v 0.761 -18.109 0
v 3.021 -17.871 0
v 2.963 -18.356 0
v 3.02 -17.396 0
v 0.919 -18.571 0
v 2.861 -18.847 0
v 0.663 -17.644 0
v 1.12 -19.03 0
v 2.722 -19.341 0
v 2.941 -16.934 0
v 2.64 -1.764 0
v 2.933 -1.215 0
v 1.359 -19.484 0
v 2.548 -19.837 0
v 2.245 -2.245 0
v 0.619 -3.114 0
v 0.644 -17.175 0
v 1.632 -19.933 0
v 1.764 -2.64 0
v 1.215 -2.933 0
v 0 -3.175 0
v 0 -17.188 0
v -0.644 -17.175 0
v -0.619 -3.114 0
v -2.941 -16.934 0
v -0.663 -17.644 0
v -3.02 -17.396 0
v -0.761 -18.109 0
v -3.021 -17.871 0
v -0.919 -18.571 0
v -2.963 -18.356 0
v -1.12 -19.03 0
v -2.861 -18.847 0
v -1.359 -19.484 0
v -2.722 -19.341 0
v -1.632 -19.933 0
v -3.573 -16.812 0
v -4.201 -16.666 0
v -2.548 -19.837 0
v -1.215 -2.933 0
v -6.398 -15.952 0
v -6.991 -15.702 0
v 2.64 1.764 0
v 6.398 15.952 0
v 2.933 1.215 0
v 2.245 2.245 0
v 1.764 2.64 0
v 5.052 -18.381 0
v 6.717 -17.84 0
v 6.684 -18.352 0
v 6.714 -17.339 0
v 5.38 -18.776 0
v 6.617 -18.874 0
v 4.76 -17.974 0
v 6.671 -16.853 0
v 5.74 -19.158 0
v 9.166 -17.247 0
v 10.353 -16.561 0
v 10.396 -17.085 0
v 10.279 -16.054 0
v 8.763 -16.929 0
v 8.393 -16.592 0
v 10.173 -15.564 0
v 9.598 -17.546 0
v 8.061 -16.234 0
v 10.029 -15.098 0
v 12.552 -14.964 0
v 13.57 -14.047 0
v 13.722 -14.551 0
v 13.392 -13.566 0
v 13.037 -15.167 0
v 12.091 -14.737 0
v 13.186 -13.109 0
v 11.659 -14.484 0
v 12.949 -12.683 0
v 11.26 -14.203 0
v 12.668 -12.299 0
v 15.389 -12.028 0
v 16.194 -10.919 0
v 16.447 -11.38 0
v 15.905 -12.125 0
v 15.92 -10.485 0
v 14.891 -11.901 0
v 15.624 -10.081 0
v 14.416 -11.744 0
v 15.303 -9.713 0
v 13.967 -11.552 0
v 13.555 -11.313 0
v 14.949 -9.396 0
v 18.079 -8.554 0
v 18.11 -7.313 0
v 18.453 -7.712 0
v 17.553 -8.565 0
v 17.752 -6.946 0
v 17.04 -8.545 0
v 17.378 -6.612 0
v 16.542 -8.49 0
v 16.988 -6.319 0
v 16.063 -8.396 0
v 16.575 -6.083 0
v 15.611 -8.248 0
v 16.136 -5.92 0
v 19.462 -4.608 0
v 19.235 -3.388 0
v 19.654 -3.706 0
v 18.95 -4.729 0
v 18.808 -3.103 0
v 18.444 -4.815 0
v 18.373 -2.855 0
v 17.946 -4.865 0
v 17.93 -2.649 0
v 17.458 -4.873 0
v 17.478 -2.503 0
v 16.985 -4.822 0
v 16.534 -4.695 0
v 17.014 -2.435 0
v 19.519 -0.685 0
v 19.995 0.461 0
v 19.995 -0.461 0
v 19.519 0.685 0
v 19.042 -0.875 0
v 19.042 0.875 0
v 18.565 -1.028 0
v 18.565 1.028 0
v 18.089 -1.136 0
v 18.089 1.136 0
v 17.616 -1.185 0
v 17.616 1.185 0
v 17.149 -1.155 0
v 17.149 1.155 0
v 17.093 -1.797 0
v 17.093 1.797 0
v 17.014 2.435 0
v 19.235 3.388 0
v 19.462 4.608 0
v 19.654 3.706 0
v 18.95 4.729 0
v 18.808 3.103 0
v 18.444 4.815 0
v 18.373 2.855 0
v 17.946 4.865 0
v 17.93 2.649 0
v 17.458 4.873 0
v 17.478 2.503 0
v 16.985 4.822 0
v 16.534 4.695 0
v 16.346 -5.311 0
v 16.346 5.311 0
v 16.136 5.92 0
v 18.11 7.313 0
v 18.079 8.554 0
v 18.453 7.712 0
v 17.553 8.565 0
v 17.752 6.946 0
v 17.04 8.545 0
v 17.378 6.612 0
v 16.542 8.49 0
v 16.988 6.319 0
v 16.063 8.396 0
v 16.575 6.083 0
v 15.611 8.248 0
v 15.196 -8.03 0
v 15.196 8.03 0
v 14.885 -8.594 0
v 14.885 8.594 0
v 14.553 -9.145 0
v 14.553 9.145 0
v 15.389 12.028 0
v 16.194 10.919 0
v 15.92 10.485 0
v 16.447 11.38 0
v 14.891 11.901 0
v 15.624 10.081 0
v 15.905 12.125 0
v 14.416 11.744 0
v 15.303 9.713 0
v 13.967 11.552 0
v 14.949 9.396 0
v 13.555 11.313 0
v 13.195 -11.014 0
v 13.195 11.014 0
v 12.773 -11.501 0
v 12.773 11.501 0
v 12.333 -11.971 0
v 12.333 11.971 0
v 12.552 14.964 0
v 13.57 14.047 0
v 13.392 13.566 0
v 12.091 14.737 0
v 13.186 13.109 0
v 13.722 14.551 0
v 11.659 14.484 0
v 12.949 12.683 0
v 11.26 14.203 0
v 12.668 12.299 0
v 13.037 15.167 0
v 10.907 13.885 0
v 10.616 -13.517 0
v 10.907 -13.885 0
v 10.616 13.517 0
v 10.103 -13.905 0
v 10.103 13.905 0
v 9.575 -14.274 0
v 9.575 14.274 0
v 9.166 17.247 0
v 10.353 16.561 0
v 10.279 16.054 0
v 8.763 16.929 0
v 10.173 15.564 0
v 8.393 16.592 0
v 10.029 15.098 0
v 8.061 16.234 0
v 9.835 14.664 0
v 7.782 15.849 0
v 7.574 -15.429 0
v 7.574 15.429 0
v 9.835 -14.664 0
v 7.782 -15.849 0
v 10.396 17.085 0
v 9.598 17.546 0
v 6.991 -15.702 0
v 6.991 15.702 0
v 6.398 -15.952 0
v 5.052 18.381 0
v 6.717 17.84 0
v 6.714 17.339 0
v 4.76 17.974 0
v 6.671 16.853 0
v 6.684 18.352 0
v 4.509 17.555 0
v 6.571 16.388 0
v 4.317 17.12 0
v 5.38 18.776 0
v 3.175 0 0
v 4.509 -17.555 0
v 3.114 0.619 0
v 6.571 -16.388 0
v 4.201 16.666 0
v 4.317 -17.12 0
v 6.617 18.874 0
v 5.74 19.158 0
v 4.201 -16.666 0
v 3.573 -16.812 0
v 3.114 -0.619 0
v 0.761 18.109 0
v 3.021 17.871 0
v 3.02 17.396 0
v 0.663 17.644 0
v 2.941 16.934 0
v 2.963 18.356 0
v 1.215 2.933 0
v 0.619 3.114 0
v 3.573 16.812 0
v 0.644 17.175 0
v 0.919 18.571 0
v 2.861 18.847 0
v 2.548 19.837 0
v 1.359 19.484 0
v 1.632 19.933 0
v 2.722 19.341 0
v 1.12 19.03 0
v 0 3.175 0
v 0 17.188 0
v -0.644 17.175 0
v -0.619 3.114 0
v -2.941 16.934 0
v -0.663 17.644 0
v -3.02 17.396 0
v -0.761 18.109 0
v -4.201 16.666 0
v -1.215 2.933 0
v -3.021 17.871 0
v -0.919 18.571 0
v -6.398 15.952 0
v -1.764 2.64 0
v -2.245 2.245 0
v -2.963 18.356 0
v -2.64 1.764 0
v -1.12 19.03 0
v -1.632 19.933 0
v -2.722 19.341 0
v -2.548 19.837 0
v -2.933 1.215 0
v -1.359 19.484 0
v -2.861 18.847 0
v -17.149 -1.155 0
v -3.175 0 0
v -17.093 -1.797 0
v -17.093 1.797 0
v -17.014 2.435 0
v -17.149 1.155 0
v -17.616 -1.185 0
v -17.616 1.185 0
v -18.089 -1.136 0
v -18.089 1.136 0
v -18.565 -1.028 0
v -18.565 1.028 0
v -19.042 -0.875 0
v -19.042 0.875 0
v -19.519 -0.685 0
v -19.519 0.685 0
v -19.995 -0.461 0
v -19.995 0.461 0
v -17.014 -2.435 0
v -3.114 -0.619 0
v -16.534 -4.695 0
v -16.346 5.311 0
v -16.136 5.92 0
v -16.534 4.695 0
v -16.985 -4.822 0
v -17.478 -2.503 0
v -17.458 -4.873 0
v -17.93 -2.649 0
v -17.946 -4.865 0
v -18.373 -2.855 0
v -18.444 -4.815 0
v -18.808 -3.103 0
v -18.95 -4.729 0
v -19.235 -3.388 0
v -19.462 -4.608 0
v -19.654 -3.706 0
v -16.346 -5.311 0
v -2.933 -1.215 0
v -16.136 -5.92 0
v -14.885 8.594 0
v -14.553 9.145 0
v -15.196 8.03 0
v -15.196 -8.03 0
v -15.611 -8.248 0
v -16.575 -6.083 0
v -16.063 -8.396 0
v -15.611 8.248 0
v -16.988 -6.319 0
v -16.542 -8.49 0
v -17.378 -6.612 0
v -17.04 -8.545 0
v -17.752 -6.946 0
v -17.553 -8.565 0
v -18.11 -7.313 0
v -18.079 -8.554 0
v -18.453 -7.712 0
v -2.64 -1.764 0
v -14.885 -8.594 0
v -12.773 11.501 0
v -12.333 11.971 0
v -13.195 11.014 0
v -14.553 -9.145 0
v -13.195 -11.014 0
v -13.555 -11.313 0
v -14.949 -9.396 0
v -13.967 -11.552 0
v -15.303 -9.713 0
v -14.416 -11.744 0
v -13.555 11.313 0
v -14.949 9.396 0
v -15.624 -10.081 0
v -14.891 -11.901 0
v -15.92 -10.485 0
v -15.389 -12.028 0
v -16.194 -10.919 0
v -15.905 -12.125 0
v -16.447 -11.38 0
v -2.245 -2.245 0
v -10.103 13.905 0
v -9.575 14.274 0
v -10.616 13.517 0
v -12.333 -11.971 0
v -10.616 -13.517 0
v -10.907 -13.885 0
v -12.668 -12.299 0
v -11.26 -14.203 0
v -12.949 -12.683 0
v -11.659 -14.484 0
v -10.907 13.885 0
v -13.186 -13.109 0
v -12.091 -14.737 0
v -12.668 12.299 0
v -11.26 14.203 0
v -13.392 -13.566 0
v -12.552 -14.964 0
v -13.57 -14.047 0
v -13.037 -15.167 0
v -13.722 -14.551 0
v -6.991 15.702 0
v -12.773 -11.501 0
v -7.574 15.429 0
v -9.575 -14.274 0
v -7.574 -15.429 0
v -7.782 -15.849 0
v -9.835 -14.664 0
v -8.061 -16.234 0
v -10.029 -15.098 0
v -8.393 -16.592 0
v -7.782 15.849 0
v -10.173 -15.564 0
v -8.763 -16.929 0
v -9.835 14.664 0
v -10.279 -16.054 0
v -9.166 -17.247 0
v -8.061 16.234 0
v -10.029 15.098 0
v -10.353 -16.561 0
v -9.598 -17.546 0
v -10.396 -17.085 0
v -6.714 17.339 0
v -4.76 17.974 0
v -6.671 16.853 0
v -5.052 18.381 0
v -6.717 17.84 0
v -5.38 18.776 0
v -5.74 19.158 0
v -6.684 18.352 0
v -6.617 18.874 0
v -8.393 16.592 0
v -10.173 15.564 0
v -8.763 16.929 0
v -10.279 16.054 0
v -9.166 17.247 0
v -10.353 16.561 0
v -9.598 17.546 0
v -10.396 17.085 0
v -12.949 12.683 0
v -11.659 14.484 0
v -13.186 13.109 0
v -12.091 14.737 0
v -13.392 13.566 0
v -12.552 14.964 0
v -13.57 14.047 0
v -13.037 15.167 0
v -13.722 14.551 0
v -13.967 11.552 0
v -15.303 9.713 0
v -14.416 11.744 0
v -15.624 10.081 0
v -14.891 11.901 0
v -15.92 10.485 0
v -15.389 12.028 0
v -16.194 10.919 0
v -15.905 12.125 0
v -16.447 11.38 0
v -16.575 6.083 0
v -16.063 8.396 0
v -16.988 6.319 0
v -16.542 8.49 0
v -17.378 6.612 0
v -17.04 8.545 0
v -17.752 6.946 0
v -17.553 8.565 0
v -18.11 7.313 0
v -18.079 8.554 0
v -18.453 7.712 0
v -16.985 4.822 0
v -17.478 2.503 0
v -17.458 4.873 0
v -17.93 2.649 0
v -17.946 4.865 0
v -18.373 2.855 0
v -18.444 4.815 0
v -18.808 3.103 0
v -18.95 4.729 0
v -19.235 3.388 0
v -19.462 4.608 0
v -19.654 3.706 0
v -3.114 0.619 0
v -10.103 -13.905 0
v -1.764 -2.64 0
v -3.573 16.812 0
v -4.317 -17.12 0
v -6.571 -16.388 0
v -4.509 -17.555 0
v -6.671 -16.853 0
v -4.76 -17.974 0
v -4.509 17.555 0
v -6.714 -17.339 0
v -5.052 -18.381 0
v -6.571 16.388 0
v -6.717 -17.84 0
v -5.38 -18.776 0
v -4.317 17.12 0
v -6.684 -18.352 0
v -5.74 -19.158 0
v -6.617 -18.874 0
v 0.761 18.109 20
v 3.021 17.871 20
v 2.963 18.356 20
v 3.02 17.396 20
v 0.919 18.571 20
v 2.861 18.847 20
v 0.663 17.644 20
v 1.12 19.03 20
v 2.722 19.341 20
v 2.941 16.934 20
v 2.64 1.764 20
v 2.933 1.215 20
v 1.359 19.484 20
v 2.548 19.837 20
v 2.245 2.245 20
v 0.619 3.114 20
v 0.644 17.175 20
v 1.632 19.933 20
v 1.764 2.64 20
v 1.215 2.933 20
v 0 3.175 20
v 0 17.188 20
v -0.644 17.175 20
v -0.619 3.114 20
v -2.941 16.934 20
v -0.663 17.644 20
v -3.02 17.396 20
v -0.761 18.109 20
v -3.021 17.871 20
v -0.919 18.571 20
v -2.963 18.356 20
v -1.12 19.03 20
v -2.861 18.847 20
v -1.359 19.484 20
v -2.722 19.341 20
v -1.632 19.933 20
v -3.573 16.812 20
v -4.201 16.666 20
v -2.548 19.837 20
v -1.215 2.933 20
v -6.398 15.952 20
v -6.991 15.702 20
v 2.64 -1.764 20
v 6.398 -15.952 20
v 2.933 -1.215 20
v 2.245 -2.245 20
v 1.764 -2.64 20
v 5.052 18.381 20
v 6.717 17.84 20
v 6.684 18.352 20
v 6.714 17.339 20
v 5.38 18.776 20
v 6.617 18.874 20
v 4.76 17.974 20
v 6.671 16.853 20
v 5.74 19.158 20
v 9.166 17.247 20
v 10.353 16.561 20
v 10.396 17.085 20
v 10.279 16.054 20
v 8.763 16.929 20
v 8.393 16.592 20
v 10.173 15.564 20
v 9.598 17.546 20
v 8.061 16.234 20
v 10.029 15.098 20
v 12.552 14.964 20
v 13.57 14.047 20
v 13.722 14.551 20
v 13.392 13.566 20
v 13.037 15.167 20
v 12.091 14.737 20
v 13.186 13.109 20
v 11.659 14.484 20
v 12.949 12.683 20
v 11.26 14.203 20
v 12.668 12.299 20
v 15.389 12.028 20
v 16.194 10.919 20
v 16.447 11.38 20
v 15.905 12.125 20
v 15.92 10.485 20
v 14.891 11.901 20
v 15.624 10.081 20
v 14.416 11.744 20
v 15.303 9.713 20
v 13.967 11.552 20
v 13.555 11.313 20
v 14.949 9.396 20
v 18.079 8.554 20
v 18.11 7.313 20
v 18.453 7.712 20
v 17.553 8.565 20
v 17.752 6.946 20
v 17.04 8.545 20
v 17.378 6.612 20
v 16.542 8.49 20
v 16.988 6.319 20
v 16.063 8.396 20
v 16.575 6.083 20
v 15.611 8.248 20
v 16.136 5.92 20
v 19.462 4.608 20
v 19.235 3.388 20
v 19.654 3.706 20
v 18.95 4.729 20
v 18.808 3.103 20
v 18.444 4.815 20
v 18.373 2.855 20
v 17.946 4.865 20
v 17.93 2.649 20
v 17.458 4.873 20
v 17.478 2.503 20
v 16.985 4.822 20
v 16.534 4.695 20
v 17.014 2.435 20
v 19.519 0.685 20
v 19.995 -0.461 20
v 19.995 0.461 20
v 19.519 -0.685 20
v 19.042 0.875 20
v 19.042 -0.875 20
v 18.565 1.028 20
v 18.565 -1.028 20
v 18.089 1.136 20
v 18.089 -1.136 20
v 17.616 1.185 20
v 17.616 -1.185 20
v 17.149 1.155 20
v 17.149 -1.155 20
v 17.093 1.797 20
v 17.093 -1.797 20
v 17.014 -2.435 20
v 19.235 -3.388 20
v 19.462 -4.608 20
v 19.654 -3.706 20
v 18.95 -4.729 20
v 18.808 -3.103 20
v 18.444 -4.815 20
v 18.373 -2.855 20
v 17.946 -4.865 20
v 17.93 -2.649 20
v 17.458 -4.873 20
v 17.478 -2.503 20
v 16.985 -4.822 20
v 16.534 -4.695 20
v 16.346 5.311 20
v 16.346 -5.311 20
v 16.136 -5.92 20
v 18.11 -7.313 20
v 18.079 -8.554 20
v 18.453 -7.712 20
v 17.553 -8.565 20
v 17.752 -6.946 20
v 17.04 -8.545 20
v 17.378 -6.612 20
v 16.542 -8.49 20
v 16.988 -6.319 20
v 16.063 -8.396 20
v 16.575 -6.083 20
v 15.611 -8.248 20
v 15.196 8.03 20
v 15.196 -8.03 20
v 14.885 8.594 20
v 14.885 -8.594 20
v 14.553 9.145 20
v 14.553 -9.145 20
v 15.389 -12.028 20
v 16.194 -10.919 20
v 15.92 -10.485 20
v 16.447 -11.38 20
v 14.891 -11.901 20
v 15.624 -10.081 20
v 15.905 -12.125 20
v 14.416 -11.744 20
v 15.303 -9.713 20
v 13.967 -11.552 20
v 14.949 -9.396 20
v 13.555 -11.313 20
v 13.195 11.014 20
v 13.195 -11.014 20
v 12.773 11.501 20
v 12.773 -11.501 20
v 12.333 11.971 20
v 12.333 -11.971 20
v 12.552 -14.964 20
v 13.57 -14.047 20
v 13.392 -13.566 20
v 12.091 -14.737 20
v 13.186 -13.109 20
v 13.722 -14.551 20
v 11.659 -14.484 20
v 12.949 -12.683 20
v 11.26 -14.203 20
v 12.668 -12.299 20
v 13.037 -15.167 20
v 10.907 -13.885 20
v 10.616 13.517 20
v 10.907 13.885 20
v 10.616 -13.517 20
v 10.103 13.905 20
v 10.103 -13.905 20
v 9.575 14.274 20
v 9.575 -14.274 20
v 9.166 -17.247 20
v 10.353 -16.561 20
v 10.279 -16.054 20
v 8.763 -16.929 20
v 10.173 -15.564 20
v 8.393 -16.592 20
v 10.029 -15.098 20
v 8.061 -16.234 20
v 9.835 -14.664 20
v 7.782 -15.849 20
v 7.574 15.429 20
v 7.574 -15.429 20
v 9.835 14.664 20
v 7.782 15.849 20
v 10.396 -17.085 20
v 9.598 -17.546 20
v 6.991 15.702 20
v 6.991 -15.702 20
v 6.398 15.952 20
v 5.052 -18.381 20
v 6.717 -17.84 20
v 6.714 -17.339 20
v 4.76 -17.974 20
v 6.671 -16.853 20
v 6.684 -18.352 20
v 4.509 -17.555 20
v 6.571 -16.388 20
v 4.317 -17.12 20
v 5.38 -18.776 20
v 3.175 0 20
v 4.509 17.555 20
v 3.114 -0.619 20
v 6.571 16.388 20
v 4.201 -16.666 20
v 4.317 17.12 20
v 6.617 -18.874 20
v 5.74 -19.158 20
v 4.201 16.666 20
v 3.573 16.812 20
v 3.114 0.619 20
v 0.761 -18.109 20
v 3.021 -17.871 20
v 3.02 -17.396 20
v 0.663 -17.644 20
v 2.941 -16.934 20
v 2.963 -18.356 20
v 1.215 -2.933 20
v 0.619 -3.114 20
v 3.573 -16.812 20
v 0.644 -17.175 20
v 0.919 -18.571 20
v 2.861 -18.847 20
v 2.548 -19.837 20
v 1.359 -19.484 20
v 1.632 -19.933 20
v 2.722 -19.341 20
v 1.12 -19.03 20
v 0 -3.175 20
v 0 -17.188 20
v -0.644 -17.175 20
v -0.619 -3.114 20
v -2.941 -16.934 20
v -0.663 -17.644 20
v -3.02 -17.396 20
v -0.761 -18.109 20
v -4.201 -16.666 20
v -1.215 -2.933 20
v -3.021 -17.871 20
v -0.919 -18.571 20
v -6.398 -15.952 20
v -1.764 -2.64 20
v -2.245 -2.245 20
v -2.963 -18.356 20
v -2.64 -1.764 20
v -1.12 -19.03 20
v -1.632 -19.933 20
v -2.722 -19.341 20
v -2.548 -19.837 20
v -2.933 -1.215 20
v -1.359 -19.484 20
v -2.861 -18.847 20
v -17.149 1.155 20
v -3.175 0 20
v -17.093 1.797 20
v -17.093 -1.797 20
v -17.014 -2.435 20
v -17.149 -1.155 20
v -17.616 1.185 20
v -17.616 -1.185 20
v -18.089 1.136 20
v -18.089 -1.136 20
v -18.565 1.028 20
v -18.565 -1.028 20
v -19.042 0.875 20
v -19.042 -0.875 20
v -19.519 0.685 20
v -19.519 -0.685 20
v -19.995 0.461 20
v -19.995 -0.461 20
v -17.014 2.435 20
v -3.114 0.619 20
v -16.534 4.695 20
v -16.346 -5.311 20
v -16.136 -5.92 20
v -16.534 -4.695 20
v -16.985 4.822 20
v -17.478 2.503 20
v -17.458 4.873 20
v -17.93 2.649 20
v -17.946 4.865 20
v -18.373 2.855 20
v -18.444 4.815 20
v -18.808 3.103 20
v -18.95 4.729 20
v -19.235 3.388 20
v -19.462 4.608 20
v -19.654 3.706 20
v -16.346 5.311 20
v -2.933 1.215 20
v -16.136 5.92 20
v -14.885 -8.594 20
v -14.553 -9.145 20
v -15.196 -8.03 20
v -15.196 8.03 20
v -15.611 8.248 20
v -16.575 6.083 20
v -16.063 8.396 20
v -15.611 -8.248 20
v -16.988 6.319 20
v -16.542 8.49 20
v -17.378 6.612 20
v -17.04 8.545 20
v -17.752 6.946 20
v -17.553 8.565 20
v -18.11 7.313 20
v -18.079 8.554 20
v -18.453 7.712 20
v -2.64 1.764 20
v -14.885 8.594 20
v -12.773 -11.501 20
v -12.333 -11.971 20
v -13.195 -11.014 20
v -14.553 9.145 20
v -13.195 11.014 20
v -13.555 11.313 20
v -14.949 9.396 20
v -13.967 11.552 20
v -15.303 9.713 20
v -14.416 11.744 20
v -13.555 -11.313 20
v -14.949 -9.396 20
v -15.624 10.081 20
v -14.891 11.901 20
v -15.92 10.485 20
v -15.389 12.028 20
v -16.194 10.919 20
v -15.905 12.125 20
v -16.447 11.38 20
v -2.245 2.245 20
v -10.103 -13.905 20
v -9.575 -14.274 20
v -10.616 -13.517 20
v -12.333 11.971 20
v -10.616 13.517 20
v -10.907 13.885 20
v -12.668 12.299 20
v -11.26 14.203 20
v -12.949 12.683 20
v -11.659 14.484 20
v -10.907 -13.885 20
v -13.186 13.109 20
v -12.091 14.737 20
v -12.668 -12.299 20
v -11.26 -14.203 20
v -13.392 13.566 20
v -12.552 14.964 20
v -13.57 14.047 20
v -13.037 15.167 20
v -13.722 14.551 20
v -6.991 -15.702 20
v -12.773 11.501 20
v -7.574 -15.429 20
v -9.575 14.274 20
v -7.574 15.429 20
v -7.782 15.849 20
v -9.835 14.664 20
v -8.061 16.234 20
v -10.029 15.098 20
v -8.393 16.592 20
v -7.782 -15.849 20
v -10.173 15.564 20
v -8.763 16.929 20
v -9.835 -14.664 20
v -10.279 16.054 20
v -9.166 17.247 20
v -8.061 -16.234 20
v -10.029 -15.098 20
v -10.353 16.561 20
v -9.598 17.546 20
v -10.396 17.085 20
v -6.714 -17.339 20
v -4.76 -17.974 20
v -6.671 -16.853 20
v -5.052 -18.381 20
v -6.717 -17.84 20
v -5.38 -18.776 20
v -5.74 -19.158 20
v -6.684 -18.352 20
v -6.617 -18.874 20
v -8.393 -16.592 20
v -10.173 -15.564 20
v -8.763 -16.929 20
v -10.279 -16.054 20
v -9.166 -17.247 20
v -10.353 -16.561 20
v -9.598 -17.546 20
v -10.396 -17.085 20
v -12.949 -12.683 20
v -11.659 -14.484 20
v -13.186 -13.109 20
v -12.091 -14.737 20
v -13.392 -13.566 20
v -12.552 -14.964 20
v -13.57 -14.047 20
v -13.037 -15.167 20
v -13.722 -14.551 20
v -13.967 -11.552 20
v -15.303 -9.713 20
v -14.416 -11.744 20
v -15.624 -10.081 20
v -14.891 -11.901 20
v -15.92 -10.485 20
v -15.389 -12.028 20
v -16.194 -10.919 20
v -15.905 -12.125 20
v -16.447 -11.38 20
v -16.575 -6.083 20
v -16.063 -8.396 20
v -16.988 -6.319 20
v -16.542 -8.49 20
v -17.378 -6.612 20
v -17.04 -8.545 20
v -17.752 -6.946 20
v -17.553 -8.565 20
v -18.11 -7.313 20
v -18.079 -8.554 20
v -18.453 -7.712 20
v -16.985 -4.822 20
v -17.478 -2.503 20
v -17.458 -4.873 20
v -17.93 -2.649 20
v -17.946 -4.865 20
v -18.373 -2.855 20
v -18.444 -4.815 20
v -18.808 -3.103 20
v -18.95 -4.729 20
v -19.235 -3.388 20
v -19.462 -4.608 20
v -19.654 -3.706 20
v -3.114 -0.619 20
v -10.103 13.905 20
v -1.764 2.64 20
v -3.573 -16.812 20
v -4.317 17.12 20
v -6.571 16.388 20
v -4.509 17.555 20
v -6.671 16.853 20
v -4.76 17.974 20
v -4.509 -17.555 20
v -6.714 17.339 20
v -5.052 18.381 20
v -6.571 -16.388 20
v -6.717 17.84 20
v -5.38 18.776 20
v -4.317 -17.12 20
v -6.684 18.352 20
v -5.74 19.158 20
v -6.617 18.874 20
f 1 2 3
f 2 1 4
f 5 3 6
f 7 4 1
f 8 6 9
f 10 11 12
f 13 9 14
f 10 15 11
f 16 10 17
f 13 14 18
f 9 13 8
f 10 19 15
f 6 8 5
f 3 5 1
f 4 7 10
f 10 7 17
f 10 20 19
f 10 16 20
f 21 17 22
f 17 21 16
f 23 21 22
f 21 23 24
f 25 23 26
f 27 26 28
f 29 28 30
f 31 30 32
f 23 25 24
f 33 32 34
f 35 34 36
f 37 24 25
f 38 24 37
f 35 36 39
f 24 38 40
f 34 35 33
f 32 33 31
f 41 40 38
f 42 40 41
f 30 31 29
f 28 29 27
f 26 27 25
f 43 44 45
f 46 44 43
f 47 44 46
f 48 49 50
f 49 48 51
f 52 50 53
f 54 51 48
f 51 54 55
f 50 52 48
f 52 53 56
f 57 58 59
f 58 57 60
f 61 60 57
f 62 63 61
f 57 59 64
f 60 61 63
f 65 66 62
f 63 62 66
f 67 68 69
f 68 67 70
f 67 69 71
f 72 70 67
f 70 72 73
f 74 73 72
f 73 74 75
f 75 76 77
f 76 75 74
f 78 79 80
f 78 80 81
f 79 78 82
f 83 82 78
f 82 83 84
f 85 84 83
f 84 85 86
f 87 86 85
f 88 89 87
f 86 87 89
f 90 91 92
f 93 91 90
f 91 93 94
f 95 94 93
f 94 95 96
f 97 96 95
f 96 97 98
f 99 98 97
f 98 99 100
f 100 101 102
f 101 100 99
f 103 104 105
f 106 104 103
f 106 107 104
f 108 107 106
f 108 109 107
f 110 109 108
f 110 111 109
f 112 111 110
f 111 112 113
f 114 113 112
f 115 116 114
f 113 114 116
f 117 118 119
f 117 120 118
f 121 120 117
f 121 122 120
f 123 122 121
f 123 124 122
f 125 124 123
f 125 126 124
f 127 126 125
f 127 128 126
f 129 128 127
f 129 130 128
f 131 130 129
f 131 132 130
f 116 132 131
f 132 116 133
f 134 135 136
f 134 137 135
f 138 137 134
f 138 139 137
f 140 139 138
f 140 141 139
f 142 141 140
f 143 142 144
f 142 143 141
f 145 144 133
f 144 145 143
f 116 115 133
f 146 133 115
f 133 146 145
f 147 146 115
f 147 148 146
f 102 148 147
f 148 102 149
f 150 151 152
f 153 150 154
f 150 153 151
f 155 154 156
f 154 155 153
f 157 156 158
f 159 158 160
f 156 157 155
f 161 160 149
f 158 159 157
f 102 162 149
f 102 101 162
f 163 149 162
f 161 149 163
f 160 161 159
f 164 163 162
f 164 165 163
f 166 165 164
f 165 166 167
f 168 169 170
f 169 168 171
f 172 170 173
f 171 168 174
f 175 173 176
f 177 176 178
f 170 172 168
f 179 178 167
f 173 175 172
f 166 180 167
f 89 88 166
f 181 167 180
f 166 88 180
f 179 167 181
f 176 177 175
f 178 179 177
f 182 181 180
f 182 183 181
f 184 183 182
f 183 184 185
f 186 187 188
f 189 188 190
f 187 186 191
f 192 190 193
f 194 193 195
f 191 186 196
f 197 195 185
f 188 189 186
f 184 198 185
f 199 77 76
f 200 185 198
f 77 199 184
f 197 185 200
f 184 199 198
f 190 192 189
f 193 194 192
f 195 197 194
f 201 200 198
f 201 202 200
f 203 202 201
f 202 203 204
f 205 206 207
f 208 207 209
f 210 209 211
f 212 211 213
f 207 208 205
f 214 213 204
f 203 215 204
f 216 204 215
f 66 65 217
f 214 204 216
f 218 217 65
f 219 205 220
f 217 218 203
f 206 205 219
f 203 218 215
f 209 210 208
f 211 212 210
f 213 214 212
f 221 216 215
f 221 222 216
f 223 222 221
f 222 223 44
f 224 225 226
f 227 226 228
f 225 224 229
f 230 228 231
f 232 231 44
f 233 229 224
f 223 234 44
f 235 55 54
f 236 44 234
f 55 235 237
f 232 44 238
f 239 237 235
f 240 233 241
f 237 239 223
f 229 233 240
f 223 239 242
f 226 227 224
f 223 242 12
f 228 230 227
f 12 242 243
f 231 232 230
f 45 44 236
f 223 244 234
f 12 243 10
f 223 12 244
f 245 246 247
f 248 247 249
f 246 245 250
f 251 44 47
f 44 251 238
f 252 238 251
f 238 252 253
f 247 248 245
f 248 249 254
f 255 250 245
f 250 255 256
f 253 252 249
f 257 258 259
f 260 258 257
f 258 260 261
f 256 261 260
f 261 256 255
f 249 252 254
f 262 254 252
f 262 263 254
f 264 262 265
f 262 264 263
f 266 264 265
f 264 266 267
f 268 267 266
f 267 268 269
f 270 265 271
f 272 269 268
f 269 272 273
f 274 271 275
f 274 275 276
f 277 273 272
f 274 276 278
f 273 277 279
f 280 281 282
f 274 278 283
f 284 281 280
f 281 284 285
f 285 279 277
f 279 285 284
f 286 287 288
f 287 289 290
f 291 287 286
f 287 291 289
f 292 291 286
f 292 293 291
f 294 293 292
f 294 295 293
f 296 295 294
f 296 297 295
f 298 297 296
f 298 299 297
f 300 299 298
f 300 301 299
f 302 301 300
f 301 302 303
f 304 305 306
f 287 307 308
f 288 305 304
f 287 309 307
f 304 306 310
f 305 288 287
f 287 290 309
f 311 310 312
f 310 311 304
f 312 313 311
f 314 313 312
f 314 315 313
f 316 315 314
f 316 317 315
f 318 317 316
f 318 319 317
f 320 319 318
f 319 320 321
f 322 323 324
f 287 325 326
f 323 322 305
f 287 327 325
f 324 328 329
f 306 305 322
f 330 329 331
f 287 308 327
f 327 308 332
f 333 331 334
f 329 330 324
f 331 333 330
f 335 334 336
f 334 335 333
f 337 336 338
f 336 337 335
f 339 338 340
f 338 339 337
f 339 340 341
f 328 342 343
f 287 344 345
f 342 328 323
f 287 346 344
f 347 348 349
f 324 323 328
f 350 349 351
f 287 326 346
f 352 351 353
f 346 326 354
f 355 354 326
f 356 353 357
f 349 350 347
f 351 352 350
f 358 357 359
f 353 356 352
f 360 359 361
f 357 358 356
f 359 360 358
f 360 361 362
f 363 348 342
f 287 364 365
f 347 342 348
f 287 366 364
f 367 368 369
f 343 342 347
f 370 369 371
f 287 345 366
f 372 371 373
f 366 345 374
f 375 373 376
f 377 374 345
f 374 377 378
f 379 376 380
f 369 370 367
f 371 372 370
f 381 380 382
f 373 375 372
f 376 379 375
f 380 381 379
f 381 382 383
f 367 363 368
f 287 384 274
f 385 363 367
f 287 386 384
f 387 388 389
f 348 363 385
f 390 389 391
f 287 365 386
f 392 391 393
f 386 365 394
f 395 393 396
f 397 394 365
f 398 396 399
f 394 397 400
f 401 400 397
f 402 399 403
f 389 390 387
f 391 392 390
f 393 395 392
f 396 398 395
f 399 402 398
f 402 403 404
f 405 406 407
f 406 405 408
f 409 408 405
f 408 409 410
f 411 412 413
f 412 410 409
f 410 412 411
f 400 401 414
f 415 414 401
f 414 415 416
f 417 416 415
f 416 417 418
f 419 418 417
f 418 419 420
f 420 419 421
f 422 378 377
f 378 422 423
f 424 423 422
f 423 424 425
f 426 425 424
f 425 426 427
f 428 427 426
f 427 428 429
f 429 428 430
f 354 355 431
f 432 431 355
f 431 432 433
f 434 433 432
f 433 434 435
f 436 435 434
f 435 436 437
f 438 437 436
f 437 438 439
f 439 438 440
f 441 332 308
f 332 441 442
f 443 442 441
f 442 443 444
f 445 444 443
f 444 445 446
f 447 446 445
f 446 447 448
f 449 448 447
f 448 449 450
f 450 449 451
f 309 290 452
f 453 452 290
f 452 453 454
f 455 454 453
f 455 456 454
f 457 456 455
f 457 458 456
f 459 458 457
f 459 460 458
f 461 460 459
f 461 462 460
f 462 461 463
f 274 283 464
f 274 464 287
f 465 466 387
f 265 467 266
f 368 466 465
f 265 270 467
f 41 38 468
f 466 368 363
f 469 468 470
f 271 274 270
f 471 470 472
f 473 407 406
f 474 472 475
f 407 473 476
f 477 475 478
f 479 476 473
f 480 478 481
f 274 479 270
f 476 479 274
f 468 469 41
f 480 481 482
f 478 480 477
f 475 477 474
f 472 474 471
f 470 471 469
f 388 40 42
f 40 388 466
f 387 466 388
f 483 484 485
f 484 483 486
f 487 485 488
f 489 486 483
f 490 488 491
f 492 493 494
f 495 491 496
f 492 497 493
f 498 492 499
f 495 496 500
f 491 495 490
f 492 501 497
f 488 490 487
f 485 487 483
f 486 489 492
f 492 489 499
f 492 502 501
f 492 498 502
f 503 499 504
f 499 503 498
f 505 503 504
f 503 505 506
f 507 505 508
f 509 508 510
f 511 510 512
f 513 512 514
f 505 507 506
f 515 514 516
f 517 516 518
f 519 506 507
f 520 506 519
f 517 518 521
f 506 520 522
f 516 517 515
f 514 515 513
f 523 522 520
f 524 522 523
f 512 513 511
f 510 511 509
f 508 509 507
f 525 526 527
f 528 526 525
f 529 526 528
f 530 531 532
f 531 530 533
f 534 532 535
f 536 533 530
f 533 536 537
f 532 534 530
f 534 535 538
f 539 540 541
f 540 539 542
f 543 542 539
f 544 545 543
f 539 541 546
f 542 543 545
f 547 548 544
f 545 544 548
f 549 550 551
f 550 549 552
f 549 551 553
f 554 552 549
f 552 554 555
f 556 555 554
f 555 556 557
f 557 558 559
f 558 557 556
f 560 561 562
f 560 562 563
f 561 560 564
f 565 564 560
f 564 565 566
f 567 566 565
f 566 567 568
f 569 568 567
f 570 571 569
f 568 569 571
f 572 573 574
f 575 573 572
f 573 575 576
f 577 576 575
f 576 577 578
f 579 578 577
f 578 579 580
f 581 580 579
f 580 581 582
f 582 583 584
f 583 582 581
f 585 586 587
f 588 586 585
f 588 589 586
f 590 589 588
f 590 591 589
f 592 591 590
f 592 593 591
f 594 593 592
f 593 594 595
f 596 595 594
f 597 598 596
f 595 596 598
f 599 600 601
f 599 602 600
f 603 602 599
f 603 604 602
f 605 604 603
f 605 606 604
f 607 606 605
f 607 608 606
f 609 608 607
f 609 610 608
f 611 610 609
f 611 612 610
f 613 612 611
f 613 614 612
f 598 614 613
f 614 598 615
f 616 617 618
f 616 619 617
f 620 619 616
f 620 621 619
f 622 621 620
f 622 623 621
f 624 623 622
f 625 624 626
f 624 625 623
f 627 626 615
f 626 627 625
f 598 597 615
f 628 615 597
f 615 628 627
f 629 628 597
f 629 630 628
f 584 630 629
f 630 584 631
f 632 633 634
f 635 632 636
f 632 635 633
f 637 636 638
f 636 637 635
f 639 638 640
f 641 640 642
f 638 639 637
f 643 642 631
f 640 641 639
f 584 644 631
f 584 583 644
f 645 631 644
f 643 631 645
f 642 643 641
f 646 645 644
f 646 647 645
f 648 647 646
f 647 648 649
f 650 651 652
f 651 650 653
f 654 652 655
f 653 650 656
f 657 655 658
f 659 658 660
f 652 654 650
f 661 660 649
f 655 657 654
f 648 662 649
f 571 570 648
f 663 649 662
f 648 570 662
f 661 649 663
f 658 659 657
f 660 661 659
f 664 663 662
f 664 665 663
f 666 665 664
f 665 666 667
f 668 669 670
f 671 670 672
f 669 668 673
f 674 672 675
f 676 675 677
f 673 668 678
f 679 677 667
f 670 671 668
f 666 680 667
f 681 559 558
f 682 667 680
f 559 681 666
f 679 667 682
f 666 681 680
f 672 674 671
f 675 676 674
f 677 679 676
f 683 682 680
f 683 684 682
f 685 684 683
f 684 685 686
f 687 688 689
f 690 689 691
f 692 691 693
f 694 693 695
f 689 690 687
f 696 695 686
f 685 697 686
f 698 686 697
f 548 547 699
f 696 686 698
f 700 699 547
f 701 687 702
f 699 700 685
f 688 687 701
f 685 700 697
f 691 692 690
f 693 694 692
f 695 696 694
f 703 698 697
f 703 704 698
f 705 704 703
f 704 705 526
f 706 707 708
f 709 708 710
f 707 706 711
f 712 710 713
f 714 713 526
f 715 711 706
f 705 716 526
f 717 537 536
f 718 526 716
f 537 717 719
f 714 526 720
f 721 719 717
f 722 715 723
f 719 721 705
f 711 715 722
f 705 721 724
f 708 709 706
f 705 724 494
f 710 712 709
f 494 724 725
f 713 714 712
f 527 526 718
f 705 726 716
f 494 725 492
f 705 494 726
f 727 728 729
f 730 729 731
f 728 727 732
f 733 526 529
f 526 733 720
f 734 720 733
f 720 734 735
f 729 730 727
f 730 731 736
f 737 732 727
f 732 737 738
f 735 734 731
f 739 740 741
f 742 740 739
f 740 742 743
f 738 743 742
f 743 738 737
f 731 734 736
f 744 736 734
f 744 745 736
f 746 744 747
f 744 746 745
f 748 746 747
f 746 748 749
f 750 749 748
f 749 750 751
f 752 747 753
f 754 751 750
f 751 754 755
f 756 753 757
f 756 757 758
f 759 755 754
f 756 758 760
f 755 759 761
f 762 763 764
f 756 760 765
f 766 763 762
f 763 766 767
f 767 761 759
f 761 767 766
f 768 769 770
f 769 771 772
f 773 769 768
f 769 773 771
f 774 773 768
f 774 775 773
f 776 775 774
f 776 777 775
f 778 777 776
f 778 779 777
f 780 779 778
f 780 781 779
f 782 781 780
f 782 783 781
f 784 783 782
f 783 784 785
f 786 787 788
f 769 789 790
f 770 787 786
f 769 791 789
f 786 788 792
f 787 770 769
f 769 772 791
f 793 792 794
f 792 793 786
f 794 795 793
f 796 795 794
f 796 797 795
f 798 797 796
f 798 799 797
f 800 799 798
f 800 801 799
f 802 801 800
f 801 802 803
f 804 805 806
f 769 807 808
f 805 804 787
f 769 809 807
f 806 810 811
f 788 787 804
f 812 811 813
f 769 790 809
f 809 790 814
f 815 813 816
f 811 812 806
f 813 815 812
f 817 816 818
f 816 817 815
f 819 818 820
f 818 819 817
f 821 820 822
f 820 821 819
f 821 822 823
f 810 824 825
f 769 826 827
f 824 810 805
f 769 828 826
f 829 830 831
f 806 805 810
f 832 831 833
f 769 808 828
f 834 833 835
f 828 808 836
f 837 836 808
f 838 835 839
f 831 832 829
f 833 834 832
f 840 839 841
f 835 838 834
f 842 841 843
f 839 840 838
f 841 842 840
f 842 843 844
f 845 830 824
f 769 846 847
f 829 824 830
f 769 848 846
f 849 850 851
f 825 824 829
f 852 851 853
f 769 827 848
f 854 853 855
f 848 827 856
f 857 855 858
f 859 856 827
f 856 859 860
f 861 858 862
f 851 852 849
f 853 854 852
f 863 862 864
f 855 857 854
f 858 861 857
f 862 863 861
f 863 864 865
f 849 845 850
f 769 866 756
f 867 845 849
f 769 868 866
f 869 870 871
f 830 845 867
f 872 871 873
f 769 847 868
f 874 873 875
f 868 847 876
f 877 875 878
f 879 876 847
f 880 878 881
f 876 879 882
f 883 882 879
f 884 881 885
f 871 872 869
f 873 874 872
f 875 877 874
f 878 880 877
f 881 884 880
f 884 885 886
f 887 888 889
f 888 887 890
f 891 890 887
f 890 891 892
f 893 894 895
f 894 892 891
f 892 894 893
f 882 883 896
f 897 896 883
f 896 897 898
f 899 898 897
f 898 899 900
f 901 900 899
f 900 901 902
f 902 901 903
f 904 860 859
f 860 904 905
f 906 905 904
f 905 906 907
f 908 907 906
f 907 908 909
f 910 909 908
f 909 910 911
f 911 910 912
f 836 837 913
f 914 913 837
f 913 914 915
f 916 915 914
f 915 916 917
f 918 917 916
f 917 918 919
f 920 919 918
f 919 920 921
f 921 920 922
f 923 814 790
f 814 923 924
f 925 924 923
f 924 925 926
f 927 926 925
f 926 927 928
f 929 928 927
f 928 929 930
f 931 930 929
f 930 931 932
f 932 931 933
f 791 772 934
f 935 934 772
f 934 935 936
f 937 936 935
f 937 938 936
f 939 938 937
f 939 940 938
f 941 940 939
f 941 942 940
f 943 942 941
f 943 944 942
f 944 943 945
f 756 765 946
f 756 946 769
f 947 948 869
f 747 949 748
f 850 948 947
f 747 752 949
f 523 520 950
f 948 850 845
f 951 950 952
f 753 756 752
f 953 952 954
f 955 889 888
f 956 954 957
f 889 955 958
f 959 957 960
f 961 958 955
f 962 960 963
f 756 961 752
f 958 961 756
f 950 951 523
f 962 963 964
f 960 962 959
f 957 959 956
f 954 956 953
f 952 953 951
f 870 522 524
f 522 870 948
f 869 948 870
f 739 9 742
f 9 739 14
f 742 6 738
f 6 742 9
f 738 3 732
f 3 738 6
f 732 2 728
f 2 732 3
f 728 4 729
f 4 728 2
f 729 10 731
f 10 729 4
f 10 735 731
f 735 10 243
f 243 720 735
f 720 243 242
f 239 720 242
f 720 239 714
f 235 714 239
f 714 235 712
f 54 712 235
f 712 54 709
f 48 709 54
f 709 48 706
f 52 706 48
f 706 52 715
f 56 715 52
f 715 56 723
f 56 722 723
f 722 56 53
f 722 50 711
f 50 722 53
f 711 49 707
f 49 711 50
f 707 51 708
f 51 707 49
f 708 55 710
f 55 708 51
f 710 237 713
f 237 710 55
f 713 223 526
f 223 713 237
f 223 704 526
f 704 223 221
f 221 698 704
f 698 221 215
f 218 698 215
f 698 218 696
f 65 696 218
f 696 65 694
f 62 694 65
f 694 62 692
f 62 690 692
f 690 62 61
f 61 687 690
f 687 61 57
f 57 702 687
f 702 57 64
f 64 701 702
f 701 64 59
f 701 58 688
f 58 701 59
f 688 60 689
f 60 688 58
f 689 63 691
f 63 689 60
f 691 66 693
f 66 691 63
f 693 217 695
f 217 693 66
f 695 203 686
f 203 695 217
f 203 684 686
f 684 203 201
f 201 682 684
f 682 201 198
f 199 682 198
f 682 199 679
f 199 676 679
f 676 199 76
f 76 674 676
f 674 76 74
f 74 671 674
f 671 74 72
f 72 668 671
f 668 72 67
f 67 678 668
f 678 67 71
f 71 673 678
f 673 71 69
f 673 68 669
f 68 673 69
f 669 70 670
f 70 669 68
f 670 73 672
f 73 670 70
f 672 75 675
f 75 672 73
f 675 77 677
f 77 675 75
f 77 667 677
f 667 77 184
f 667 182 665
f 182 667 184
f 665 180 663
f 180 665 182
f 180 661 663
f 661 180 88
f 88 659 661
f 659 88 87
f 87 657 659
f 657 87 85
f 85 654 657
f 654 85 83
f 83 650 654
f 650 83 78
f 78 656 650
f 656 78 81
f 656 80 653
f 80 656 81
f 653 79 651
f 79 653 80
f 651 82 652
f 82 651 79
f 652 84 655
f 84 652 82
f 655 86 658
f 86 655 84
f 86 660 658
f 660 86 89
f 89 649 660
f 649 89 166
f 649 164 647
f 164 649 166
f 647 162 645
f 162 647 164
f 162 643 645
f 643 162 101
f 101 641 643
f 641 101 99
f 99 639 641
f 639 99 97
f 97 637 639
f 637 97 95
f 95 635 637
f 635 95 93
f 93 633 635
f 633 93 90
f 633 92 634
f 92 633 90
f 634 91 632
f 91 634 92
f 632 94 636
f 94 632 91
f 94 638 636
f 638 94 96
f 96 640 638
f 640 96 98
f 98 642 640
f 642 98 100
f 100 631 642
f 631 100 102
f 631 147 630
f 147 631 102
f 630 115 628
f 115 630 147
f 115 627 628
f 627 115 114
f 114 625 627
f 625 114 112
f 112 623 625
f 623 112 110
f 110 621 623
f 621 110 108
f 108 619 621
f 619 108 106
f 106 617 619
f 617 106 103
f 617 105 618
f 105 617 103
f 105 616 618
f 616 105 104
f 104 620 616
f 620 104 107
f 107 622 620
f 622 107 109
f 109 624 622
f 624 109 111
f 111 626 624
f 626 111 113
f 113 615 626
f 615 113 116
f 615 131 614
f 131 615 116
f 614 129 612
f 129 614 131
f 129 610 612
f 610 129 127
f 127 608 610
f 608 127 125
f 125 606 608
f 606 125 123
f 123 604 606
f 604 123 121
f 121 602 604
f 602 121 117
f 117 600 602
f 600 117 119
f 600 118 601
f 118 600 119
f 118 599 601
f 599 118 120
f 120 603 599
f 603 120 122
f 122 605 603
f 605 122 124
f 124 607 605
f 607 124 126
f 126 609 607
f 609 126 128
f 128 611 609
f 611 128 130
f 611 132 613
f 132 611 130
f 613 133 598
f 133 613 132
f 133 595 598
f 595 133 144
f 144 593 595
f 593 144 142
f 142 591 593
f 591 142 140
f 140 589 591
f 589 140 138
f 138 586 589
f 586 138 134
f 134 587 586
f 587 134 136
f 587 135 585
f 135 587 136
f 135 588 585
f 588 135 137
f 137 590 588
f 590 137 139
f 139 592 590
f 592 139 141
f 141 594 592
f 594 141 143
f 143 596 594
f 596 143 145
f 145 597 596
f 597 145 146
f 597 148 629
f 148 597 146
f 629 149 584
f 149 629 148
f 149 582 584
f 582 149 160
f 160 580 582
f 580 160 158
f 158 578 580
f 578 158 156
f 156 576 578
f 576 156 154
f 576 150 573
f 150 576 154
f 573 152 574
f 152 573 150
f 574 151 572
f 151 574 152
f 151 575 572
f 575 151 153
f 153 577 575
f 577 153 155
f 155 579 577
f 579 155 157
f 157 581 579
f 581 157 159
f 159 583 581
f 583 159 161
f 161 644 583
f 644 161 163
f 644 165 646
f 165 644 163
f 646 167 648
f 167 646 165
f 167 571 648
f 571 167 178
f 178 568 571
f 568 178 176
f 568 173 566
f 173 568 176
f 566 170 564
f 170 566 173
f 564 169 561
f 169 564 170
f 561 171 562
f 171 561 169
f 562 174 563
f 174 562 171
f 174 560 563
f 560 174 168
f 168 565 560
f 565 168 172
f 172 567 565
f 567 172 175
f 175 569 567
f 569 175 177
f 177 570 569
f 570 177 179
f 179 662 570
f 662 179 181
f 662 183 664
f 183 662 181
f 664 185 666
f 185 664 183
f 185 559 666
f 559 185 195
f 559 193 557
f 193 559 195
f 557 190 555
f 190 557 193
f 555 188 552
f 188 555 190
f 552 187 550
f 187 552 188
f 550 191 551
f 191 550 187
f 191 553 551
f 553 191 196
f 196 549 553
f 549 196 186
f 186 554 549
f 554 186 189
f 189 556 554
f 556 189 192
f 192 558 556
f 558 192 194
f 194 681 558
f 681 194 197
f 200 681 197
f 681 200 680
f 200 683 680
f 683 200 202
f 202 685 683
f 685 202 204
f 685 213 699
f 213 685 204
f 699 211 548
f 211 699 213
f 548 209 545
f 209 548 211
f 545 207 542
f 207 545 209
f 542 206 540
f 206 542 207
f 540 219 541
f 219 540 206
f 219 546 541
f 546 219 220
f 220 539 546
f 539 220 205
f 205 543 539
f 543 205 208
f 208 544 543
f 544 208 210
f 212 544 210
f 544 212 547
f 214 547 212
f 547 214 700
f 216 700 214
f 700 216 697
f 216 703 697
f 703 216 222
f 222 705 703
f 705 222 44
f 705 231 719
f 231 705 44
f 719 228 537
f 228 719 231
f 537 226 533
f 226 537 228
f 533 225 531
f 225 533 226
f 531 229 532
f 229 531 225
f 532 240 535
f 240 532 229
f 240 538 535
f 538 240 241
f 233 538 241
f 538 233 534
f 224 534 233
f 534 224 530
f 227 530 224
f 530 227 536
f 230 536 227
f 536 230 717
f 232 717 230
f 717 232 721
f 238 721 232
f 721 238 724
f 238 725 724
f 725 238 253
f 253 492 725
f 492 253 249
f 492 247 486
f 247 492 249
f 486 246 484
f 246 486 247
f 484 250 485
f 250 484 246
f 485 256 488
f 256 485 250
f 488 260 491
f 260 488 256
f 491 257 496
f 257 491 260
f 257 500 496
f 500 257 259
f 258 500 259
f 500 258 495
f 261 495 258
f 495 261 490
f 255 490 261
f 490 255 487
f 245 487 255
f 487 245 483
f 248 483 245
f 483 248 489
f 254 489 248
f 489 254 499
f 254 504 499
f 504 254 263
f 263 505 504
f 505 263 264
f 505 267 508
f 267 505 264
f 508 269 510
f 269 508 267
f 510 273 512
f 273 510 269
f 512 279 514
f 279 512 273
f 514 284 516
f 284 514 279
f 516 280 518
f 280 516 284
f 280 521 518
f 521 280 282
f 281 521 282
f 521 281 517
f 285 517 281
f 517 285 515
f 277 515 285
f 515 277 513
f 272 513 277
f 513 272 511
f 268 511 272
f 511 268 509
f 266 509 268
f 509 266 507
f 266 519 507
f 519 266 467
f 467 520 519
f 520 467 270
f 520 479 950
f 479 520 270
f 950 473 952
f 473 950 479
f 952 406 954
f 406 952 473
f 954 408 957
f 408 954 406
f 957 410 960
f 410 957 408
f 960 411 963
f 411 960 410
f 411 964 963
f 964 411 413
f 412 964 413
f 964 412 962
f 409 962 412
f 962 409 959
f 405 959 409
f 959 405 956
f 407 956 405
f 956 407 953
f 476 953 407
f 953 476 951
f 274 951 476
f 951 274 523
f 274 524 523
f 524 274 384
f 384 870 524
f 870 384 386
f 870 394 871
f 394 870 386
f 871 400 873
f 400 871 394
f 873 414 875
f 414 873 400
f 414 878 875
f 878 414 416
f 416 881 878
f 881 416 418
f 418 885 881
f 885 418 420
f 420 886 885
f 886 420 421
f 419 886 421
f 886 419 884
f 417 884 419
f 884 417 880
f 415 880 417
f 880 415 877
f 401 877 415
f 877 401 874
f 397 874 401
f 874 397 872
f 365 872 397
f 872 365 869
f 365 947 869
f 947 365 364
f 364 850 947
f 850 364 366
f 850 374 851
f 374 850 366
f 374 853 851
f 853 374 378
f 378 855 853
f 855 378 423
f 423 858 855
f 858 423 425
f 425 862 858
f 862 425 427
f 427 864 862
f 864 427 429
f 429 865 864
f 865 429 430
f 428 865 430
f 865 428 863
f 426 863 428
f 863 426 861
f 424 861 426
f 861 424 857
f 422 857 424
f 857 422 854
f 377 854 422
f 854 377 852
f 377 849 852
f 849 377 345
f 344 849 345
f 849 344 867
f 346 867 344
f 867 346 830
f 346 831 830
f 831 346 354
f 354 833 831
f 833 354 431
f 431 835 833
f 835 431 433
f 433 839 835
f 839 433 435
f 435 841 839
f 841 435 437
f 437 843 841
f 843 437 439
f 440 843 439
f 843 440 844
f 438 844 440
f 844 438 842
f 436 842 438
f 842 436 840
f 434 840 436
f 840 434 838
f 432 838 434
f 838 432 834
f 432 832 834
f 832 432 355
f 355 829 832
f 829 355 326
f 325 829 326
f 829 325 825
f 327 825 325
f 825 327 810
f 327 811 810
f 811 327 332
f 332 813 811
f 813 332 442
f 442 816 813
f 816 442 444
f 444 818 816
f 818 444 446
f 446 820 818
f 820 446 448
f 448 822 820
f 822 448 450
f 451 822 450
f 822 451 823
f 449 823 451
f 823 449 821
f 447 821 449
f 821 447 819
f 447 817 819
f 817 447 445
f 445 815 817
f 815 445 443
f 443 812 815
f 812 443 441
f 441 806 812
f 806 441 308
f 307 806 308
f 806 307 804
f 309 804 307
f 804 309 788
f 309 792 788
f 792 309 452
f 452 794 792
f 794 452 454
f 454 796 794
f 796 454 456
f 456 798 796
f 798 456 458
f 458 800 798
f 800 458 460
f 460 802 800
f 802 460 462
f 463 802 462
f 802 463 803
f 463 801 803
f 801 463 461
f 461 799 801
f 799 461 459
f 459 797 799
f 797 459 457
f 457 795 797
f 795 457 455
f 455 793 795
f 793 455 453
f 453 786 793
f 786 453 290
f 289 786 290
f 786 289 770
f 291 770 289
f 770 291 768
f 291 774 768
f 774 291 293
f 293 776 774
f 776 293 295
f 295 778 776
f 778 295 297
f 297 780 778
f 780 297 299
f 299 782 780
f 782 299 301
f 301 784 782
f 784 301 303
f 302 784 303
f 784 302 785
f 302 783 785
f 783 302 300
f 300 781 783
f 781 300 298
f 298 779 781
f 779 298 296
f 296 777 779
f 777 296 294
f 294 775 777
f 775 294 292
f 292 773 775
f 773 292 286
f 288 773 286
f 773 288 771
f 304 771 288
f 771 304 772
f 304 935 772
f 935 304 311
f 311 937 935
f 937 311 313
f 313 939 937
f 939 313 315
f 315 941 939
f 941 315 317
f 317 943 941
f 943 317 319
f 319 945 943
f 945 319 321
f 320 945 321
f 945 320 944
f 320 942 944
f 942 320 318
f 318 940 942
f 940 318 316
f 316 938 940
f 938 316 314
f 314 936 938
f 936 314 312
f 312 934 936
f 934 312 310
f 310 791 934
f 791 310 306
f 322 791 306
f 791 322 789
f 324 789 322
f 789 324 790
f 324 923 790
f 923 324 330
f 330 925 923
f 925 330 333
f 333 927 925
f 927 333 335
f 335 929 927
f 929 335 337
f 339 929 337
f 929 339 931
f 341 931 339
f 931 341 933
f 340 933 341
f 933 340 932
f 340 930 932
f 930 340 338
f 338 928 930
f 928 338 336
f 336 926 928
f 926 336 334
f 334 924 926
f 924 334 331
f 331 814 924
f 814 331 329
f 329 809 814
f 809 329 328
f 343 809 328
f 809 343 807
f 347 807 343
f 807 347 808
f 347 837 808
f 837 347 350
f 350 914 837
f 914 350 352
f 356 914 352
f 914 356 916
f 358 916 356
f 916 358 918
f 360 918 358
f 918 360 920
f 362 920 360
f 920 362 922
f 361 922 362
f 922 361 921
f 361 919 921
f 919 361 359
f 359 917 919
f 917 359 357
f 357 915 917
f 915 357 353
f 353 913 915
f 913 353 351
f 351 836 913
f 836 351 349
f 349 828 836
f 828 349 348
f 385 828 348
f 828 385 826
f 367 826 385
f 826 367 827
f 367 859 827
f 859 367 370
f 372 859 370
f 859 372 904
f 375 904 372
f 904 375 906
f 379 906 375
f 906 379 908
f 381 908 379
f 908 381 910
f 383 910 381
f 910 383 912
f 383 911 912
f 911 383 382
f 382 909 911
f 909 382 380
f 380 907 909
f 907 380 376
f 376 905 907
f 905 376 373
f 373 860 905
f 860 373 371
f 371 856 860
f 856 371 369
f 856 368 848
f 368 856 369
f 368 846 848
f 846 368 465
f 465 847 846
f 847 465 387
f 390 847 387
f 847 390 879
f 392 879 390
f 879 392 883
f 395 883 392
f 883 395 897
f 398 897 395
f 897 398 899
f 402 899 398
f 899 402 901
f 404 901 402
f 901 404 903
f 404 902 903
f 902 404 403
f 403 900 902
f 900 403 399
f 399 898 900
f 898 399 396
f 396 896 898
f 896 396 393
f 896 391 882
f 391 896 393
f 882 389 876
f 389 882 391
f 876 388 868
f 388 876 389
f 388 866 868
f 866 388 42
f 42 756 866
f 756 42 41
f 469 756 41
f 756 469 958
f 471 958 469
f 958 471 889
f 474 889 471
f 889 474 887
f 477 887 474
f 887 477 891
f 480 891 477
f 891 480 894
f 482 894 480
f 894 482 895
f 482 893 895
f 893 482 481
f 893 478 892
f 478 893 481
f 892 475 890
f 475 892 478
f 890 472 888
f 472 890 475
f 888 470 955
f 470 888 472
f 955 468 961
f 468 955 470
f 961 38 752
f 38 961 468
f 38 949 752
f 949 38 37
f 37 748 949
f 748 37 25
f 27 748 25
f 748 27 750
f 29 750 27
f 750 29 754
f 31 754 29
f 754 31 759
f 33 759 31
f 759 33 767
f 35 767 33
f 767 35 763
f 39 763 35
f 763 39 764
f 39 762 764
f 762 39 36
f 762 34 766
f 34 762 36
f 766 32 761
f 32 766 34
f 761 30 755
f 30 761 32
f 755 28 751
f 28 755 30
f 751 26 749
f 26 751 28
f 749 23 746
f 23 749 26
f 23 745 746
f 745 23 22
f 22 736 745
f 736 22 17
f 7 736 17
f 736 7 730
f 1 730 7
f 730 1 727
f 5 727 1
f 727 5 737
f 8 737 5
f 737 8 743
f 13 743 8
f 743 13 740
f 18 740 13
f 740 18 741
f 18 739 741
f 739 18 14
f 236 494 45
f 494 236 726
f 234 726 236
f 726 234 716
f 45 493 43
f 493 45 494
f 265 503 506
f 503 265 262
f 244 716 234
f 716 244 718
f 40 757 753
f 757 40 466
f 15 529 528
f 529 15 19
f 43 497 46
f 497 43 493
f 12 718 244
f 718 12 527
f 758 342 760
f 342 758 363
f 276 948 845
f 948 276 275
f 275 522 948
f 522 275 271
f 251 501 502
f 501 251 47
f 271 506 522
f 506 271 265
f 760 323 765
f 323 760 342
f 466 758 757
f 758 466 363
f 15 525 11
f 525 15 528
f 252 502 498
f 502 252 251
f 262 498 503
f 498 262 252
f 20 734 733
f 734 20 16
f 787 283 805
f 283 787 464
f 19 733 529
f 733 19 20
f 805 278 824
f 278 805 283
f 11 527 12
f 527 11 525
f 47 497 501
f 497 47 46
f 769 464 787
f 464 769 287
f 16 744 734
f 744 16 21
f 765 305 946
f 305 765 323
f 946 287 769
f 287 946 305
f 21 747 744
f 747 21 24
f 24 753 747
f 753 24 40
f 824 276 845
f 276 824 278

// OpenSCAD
$fn = 32;

// ----------------------------------------------------------------------
// Spur gear: m=1.25 z=30, 40 mm tip diameter x 20 mm
// ----------------------------------------------------------------------

// --- parameters (mm) ---
gear_module = 1.25;       // module
tooth_count = 30;         // number of teeth
gear_w = 20;              // face width
pa = 20;                  // pressure angle, deg
bore = 6.35;              // shaft bore

/* --- involute profile --- */
pitch_r = gear_module * tooth_count / 2;
base_r = pitch_r * cos(pa);
tip_r = pitch_r + gear_module;
root_r = pitch_r - 1.25 * gear_module;
flank_steps = 6;

function inv_deg(a) = (tan(a) - a * PI / 180) * 180 / PI;
function flank_r(i) = root_r + (tip_r - root_r) * i / flank_steps;
function half_angle(r) = 90 / tooth_count + inv_deg(pa) - inv_deg(acos(min(1, base_r / r)));
function tooth_pt(k, i, side) =
    let (r = flank_r(i), a = k * 360 / tooth_count + side * half_angle(r))
    [r * cos(a), r * sin(a)];

module tooth_profile() {
  polygon(points = [
    for (k = [0 : tooth_count - 1])
      each [
        for (i = [0 : flank_steps]) tooth_pt(k, i, -1),
        for (i = [flank_steps : -1 : 0]) tooth_pt(k, i, 1),
        let (ta = (k + 0.5) * 360 / tooth_count)
          [root_r * cos(ta), root_r * sin(ta)]
      ]
  ]);
}

module gear_disc() {
  linear_extrude(height = gear_w) tooth_profile();
}

difference() {
  gear_disc();
  translate([0, 0, -1]) cylinder(h = gear_w + 3, d = bore);
}
